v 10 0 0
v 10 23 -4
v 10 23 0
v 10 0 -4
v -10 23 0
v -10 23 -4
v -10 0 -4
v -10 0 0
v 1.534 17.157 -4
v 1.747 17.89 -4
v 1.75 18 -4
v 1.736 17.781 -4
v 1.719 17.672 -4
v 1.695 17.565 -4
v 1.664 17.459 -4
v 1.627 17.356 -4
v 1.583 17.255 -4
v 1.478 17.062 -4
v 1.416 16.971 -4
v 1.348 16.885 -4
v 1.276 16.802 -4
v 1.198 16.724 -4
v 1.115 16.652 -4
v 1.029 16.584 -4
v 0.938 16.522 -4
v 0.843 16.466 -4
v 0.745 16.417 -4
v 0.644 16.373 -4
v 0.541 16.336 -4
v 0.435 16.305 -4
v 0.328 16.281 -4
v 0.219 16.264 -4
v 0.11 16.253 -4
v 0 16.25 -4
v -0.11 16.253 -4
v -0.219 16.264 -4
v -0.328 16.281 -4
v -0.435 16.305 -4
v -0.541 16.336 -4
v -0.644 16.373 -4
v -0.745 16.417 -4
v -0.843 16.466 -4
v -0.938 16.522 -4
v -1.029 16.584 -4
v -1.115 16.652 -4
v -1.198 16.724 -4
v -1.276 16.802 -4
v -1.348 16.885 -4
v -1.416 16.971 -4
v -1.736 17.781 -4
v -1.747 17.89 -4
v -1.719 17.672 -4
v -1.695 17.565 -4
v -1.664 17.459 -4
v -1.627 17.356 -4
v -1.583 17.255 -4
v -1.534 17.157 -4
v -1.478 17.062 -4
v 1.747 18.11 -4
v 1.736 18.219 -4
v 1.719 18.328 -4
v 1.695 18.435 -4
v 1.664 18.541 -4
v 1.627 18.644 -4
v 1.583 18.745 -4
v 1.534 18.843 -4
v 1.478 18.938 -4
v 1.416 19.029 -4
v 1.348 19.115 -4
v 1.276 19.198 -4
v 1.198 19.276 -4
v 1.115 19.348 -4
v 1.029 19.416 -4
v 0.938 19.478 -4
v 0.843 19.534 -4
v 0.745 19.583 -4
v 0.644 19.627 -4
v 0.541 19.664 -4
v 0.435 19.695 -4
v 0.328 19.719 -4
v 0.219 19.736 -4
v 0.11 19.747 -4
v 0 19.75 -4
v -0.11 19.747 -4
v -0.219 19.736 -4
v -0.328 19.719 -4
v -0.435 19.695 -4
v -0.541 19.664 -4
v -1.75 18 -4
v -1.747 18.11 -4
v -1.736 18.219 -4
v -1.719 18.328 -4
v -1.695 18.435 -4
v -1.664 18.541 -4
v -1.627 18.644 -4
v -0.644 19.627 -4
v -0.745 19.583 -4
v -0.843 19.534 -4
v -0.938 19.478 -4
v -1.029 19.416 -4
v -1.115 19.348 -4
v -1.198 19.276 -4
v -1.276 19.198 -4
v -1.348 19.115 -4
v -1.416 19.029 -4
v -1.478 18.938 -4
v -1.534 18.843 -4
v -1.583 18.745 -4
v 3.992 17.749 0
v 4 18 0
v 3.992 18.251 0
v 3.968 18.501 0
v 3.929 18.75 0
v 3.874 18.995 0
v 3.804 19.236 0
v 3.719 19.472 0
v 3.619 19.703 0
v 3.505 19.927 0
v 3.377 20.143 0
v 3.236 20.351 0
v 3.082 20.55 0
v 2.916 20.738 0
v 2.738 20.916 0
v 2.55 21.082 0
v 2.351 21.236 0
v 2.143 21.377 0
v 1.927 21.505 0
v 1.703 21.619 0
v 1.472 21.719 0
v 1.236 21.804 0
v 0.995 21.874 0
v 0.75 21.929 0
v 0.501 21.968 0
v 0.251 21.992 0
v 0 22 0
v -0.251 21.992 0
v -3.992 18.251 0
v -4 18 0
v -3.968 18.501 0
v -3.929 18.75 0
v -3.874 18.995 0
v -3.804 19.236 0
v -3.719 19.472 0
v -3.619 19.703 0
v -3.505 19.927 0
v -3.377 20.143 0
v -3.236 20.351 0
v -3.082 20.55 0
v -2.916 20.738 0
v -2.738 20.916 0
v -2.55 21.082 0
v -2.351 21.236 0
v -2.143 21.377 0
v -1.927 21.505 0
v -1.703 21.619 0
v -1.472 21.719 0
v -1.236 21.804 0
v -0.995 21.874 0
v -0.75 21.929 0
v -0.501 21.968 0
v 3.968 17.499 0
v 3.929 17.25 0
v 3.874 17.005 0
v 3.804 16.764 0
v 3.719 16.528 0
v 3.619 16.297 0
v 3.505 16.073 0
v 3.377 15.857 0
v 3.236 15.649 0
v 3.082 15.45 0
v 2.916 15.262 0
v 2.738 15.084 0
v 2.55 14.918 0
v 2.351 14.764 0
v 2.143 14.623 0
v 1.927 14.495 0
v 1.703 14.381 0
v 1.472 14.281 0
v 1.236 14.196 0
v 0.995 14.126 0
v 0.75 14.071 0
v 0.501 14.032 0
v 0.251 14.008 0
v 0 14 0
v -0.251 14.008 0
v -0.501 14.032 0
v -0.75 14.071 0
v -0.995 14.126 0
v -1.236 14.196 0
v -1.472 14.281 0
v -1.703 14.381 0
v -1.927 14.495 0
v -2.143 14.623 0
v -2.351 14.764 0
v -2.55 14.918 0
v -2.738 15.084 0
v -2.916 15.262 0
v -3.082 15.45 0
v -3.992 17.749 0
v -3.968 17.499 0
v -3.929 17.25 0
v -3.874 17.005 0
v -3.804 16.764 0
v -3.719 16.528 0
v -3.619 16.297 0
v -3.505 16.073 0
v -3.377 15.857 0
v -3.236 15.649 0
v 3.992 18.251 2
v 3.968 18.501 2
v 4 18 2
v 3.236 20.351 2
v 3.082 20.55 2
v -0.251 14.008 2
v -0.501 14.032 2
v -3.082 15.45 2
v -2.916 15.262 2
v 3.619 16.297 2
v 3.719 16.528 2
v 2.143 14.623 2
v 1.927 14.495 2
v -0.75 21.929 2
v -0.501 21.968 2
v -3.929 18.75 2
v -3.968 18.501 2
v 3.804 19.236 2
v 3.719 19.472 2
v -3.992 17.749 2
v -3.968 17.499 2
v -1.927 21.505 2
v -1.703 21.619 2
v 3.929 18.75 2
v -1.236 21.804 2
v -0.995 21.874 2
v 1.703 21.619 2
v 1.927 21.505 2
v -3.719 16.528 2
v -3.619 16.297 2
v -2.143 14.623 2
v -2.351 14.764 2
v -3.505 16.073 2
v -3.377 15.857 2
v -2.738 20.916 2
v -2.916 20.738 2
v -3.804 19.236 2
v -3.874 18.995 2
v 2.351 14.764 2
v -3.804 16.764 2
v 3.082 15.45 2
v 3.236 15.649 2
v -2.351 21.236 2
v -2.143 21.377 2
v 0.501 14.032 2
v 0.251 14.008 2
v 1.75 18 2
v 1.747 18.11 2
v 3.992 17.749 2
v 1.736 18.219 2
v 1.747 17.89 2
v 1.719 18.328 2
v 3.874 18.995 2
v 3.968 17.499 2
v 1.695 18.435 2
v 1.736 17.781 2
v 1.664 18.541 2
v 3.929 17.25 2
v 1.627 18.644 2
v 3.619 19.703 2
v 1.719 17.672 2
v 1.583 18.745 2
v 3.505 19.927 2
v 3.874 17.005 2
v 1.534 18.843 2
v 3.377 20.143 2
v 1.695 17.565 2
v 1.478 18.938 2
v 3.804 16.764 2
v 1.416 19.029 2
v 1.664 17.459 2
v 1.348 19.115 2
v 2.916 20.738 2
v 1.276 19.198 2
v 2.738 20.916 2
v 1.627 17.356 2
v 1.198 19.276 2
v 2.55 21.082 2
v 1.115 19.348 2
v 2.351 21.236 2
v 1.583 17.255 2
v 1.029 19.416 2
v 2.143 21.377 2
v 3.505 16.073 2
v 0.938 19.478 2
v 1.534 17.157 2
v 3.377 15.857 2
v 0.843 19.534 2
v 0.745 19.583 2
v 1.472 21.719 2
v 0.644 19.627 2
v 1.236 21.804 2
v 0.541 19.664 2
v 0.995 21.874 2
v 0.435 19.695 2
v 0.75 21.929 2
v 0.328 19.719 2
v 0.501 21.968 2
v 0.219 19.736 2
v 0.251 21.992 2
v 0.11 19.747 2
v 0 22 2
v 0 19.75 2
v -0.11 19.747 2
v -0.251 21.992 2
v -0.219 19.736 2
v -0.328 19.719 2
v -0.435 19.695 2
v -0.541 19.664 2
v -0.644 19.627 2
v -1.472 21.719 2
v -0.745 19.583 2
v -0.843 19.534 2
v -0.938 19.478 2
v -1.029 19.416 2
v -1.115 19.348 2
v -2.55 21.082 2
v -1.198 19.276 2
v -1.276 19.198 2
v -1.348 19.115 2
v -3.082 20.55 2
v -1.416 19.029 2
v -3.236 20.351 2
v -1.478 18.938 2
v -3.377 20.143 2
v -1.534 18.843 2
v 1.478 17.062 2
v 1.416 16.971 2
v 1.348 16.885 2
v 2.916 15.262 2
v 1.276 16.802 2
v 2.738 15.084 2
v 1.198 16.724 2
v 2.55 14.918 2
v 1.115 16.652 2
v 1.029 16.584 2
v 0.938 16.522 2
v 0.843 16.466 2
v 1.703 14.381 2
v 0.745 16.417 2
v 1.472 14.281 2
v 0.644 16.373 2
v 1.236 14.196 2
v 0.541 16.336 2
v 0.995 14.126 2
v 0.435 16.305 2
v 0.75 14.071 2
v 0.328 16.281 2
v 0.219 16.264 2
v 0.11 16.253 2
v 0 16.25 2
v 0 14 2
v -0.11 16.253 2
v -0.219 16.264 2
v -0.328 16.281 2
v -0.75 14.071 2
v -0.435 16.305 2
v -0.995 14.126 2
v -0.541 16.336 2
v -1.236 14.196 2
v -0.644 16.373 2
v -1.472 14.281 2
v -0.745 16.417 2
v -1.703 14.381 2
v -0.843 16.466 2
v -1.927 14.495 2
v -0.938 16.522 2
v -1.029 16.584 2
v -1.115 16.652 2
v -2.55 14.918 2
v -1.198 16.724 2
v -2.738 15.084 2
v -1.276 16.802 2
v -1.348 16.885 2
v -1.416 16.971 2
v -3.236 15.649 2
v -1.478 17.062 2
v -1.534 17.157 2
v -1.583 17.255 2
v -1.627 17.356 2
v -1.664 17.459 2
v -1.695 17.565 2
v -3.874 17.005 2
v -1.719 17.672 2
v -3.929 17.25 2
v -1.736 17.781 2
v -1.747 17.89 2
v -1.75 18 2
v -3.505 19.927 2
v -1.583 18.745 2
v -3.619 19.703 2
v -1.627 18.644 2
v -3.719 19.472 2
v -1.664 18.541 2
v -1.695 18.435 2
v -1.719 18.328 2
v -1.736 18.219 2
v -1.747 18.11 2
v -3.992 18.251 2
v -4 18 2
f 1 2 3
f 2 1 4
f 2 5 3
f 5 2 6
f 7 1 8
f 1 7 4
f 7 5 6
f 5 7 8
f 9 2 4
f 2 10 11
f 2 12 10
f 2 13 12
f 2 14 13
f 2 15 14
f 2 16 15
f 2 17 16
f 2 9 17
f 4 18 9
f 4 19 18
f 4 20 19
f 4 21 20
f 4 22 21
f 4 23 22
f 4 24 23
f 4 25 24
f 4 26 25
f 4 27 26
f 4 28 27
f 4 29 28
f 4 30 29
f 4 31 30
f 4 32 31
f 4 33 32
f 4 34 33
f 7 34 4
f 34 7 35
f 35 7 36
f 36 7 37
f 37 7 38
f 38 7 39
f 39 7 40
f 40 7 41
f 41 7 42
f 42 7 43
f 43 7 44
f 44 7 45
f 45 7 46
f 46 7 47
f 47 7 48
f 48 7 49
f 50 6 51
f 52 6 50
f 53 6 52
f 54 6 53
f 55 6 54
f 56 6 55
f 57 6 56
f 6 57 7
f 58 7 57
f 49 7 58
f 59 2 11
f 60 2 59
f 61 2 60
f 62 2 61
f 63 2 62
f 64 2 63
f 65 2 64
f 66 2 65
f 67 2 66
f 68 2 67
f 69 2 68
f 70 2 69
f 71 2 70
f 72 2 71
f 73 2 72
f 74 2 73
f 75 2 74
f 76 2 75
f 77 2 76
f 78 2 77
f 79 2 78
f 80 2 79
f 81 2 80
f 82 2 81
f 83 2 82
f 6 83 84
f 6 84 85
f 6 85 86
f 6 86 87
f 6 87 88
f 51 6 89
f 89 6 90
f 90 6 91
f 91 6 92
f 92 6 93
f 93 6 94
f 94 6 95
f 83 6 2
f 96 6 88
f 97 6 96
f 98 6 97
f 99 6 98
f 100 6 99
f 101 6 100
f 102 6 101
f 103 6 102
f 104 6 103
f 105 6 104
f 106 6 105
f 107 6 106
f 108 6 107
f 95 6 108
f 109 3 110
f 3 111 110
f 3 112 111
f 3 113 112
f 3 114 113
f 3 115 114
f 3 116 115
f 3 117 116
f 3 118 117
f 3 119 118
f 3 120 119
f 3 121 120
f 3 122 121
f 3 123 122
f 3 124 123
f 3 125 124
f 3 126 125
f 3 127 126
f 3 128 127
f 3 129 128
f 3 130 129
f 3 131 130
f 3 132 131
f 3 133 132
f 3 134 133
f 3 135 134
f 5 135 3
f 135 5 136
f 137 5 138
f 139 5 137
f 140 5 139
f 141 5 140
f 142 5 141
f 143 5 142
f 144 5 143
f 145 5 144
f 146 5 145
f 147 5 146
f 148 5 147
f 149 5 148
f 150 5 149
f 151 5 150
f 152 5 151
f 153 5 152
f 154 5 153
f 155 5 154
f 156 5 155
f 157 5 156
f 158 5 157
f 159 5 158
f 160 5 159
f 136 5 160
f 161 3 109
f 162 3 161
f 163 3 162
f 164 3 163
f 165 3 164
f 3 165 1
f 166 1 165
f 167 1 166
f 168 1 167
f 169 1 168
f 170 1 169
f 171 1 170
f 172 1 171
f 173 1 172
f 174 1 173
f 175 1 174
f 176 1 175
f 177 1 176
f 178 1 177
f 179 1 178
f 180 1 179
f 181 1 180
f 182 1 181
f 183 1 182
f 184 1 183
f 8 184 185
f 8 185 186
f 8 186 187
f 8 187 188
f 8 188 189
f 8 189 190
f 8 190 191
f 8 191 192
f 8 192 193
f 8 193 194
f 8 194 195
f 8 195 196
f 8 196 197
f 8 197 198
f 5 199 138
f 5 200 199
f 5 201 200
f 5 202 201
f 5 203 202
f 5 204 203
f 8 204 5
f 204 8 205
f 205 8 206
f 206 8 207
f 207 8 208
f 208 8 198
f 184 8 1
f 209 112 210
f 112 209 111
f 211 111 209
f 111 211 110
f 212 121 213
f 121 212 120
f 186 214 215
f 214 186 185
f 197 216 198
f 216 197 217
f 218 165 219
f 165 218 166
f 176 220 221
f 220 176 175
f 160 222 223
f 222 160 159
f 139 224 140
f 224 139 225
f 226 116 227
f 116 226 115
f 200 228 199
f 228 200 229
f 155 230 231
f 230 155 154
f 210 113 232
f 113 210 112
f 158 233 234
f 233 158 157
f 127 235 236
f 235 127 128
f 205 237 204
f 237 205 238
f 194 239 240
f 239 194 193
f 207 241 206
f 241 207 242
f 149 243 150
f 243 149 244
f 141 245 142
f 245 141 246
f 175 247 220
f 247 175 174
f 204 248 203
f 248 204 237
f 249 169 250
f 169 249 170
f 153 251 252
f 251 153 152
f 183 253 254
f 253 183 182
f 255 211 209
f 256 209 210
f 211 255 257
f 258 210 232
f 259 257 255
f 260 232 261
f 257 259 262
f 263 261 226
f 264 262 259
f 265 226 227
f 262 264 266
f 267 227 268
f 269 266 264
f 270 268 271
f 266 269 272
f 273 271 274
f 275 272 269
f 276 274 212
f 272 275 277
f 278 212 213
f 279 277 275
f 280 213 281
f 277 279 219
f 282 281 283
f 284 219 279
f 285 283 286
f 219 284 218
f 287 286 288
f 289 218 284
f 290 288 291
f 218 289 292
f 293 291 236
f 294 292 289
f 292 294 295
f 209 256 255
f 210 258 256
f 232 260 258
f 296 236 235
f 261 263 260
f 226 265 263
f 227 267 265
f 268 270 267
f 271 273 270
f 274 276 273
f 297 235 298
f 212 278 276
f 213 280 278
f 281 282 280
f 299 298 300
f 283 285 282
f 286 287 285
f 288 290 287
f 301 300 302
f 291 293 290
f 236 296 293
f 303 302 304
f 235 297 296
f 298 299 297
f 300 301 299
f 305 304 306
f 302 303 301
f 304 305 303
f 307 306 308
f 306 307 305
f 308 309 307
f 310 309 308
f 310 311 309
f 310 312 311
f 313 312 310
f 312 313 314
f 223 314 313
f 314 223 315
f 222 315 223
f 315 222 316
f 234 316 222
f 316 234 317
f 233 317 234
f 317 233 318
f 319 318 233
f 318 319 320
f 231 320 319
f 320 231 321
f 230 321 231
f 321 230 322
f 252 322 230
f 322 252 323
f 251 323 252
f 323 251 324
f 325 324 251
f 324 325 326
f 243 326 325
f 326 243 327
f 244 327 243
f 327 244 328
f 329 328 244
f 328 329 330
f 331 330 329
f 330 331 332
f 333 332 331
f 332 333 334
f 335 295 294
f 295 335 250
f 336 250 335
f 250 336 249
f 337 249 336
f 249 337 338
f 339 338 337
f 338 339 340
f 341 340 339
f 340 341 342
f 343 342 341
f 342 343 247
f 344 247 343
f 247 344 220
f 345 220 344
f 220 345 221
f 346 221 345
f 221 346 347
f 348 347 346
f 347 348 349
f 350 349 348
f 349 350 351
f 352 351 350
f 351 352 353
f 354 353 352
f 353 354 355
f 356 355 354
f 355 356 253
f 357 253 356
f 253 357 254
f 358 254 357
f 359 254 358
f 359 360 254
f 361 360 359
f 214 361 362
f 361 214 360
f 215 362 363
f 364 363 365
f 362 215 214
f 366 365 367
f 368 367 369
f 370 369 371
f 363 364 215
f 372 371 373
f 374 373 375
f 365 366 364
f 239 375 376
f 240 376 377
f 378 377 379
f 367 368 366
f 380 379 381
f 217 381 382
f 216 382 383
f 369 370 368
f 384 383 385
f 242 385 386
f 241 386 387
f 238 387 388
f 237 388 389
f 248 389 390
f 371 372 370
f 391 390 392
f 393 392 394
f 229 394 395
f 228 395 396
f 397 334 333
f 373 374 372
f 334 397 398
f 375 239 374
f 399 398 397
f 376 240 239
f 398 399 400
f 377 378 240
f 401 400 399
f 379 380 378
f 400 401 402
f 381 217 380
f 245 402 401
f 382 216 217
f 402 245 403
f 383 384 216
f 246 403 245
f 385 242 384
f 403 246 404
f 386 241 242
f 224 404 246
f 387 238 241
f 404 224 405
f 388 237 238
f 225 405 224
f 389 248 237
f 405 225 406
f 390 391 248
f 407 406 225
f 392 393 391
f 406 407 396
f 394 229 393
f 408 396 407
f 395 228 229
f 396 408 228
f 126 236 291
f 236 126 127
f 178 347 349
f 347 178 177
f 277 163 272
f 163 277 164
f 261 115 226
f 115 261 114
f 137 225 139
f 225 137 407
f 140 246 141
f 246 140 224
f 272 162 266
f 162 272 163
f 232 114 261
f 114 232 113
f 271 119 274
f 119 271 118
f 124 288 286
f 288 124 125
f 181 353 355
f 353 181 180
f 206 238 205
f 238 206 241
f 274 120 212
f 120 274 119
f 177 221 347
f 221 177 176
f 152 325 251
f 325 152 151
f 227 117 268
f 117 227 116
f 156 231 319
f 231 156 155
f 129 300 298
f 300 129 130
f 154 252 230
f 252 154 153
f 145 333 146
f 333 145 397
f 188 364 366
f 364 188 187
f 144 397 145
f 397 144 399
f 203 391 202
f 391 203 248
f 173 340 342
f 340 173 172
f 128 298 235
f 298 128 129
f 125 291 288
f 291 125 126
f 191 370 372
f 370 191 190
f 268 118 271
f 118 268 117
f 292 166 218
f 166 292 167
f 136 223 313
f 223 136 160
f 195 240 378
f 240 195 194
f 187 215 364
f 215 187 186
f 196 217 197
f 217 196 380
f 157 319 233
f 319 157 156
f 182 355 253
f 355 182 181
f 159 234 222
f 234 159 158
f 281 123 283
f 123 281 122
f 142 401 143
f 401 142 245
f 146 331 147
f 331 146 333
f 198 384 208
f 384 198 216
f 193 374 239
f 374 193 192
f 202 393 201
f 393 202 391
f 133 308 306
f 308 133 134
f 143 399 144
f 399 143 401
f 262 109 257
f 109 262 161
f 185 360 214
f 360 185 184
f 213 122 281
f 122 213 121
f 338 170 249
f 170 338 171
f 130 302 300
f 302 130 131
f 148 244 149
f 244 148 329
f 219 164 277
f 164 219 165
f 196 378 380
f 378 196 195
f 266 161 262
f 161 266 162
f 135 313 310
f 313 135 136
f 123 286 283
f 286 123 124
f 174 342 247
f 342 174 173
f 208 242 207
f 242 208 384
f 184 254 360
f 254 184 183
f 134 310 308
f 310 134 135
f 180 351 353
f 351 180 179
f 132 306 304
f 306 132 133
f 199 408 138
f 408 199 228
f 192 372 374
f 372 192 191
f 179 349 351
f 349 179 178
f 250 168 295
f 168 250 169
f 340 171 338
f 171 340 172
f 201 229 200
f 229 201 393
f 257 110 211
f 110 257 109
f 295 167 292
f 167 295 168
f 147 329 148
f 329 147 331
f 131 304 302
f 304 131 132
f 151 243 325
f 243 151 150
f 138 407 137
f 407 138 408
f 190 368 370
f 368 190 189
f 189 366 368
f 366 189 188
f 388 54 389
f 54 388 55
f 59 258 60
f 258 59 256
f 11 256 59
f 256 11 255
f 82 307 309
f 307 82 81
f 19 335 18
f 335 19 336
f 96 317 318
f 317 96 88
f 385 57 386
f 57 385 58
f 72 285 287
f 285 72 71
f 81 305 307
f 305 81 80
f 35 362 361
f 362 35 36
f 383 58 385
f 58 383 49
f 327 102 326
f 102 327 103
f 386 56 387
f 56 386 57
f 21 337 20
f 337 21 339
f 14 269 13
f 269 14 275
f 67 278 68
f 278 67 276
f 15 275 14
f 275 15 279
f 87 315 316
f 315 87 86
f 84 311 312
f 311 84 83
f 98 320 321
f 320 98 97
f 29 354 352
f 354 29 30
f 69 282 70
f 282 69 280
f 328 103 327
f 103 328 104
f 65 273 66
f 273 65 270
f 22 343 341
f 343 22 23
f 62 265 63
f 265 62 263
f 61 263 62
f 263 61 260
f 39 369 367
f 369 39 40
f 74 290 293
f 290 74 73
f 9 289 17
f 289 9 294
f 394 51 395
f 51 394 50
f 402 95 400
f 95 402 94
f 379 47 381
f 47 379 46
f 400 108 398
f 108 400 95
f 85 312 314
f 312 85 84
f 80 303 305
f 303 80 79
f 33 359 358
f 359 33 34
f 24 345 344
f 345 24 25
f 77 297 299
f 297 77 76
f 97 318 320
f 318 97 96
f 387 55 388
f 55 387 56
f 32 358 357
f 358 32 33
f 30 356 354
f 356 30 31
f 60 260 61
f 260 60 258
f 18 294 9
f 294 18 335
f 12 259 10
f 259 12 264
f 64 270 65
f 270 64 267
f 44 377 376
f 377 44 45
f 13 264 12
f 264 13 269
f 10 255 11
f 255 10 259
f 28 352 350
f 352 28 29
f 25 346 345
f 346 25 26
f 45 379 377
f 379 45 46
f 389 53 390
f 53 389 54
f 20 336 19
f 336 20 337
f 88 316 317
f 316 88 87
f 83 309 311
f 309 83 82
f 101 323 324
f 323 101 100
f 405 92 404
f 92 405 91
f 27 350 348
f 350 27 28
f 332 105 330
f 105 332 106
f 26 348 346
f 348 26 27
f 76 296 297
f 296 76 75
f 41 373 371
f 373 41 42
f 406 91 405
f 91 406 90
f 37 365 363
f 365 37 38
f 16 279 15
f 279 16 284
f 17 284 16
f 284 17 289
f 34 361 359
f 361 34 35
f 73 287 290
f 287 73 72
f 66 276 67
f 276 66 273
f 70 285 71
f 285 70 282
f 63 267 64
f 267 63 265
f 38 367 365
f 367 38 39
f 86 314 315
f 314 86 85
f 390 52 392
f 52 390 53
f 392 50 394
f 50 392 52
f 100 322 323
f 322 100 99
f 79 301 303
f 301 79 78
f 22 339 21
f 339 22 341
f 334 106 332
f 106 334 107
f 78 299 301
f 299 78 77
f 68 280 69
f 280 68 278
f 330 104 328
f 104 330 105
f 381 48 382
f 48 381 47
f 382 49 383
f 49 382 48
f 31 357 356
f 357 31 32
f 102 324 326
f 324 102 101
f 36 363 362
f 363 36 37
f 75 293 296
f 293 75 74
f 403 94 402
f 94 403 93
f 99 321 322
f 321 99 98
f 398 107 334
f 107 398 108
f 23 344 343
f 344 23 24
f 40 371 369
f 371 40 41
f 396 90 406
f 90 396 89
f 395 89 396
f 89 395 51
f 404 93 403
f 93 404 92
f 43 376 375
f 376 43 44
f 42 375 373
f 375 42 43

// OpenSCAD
$fn=100;

screw_d = 3.5;

joint_d = 8;
joint_h = 2;

joint_pos = 10 + 3 + 5;
total_height = joint_pos + 5;

width = 20;

module support () {
    difference() {
        union() {
            translate([-width/2,0])
            cube([width, 4, total_height]);
            
            translate([0,0,joint_pos])
            rotate([90,0,0])
            cylinder(d=joint_d, h=joint_h);
        }
        
        #translate([0,0,joint_pos])
        rotate([90,0,0])
        cylinder(d=screw_d, h=50, center=true);
    }
}

rotate([-90,0])
support();
